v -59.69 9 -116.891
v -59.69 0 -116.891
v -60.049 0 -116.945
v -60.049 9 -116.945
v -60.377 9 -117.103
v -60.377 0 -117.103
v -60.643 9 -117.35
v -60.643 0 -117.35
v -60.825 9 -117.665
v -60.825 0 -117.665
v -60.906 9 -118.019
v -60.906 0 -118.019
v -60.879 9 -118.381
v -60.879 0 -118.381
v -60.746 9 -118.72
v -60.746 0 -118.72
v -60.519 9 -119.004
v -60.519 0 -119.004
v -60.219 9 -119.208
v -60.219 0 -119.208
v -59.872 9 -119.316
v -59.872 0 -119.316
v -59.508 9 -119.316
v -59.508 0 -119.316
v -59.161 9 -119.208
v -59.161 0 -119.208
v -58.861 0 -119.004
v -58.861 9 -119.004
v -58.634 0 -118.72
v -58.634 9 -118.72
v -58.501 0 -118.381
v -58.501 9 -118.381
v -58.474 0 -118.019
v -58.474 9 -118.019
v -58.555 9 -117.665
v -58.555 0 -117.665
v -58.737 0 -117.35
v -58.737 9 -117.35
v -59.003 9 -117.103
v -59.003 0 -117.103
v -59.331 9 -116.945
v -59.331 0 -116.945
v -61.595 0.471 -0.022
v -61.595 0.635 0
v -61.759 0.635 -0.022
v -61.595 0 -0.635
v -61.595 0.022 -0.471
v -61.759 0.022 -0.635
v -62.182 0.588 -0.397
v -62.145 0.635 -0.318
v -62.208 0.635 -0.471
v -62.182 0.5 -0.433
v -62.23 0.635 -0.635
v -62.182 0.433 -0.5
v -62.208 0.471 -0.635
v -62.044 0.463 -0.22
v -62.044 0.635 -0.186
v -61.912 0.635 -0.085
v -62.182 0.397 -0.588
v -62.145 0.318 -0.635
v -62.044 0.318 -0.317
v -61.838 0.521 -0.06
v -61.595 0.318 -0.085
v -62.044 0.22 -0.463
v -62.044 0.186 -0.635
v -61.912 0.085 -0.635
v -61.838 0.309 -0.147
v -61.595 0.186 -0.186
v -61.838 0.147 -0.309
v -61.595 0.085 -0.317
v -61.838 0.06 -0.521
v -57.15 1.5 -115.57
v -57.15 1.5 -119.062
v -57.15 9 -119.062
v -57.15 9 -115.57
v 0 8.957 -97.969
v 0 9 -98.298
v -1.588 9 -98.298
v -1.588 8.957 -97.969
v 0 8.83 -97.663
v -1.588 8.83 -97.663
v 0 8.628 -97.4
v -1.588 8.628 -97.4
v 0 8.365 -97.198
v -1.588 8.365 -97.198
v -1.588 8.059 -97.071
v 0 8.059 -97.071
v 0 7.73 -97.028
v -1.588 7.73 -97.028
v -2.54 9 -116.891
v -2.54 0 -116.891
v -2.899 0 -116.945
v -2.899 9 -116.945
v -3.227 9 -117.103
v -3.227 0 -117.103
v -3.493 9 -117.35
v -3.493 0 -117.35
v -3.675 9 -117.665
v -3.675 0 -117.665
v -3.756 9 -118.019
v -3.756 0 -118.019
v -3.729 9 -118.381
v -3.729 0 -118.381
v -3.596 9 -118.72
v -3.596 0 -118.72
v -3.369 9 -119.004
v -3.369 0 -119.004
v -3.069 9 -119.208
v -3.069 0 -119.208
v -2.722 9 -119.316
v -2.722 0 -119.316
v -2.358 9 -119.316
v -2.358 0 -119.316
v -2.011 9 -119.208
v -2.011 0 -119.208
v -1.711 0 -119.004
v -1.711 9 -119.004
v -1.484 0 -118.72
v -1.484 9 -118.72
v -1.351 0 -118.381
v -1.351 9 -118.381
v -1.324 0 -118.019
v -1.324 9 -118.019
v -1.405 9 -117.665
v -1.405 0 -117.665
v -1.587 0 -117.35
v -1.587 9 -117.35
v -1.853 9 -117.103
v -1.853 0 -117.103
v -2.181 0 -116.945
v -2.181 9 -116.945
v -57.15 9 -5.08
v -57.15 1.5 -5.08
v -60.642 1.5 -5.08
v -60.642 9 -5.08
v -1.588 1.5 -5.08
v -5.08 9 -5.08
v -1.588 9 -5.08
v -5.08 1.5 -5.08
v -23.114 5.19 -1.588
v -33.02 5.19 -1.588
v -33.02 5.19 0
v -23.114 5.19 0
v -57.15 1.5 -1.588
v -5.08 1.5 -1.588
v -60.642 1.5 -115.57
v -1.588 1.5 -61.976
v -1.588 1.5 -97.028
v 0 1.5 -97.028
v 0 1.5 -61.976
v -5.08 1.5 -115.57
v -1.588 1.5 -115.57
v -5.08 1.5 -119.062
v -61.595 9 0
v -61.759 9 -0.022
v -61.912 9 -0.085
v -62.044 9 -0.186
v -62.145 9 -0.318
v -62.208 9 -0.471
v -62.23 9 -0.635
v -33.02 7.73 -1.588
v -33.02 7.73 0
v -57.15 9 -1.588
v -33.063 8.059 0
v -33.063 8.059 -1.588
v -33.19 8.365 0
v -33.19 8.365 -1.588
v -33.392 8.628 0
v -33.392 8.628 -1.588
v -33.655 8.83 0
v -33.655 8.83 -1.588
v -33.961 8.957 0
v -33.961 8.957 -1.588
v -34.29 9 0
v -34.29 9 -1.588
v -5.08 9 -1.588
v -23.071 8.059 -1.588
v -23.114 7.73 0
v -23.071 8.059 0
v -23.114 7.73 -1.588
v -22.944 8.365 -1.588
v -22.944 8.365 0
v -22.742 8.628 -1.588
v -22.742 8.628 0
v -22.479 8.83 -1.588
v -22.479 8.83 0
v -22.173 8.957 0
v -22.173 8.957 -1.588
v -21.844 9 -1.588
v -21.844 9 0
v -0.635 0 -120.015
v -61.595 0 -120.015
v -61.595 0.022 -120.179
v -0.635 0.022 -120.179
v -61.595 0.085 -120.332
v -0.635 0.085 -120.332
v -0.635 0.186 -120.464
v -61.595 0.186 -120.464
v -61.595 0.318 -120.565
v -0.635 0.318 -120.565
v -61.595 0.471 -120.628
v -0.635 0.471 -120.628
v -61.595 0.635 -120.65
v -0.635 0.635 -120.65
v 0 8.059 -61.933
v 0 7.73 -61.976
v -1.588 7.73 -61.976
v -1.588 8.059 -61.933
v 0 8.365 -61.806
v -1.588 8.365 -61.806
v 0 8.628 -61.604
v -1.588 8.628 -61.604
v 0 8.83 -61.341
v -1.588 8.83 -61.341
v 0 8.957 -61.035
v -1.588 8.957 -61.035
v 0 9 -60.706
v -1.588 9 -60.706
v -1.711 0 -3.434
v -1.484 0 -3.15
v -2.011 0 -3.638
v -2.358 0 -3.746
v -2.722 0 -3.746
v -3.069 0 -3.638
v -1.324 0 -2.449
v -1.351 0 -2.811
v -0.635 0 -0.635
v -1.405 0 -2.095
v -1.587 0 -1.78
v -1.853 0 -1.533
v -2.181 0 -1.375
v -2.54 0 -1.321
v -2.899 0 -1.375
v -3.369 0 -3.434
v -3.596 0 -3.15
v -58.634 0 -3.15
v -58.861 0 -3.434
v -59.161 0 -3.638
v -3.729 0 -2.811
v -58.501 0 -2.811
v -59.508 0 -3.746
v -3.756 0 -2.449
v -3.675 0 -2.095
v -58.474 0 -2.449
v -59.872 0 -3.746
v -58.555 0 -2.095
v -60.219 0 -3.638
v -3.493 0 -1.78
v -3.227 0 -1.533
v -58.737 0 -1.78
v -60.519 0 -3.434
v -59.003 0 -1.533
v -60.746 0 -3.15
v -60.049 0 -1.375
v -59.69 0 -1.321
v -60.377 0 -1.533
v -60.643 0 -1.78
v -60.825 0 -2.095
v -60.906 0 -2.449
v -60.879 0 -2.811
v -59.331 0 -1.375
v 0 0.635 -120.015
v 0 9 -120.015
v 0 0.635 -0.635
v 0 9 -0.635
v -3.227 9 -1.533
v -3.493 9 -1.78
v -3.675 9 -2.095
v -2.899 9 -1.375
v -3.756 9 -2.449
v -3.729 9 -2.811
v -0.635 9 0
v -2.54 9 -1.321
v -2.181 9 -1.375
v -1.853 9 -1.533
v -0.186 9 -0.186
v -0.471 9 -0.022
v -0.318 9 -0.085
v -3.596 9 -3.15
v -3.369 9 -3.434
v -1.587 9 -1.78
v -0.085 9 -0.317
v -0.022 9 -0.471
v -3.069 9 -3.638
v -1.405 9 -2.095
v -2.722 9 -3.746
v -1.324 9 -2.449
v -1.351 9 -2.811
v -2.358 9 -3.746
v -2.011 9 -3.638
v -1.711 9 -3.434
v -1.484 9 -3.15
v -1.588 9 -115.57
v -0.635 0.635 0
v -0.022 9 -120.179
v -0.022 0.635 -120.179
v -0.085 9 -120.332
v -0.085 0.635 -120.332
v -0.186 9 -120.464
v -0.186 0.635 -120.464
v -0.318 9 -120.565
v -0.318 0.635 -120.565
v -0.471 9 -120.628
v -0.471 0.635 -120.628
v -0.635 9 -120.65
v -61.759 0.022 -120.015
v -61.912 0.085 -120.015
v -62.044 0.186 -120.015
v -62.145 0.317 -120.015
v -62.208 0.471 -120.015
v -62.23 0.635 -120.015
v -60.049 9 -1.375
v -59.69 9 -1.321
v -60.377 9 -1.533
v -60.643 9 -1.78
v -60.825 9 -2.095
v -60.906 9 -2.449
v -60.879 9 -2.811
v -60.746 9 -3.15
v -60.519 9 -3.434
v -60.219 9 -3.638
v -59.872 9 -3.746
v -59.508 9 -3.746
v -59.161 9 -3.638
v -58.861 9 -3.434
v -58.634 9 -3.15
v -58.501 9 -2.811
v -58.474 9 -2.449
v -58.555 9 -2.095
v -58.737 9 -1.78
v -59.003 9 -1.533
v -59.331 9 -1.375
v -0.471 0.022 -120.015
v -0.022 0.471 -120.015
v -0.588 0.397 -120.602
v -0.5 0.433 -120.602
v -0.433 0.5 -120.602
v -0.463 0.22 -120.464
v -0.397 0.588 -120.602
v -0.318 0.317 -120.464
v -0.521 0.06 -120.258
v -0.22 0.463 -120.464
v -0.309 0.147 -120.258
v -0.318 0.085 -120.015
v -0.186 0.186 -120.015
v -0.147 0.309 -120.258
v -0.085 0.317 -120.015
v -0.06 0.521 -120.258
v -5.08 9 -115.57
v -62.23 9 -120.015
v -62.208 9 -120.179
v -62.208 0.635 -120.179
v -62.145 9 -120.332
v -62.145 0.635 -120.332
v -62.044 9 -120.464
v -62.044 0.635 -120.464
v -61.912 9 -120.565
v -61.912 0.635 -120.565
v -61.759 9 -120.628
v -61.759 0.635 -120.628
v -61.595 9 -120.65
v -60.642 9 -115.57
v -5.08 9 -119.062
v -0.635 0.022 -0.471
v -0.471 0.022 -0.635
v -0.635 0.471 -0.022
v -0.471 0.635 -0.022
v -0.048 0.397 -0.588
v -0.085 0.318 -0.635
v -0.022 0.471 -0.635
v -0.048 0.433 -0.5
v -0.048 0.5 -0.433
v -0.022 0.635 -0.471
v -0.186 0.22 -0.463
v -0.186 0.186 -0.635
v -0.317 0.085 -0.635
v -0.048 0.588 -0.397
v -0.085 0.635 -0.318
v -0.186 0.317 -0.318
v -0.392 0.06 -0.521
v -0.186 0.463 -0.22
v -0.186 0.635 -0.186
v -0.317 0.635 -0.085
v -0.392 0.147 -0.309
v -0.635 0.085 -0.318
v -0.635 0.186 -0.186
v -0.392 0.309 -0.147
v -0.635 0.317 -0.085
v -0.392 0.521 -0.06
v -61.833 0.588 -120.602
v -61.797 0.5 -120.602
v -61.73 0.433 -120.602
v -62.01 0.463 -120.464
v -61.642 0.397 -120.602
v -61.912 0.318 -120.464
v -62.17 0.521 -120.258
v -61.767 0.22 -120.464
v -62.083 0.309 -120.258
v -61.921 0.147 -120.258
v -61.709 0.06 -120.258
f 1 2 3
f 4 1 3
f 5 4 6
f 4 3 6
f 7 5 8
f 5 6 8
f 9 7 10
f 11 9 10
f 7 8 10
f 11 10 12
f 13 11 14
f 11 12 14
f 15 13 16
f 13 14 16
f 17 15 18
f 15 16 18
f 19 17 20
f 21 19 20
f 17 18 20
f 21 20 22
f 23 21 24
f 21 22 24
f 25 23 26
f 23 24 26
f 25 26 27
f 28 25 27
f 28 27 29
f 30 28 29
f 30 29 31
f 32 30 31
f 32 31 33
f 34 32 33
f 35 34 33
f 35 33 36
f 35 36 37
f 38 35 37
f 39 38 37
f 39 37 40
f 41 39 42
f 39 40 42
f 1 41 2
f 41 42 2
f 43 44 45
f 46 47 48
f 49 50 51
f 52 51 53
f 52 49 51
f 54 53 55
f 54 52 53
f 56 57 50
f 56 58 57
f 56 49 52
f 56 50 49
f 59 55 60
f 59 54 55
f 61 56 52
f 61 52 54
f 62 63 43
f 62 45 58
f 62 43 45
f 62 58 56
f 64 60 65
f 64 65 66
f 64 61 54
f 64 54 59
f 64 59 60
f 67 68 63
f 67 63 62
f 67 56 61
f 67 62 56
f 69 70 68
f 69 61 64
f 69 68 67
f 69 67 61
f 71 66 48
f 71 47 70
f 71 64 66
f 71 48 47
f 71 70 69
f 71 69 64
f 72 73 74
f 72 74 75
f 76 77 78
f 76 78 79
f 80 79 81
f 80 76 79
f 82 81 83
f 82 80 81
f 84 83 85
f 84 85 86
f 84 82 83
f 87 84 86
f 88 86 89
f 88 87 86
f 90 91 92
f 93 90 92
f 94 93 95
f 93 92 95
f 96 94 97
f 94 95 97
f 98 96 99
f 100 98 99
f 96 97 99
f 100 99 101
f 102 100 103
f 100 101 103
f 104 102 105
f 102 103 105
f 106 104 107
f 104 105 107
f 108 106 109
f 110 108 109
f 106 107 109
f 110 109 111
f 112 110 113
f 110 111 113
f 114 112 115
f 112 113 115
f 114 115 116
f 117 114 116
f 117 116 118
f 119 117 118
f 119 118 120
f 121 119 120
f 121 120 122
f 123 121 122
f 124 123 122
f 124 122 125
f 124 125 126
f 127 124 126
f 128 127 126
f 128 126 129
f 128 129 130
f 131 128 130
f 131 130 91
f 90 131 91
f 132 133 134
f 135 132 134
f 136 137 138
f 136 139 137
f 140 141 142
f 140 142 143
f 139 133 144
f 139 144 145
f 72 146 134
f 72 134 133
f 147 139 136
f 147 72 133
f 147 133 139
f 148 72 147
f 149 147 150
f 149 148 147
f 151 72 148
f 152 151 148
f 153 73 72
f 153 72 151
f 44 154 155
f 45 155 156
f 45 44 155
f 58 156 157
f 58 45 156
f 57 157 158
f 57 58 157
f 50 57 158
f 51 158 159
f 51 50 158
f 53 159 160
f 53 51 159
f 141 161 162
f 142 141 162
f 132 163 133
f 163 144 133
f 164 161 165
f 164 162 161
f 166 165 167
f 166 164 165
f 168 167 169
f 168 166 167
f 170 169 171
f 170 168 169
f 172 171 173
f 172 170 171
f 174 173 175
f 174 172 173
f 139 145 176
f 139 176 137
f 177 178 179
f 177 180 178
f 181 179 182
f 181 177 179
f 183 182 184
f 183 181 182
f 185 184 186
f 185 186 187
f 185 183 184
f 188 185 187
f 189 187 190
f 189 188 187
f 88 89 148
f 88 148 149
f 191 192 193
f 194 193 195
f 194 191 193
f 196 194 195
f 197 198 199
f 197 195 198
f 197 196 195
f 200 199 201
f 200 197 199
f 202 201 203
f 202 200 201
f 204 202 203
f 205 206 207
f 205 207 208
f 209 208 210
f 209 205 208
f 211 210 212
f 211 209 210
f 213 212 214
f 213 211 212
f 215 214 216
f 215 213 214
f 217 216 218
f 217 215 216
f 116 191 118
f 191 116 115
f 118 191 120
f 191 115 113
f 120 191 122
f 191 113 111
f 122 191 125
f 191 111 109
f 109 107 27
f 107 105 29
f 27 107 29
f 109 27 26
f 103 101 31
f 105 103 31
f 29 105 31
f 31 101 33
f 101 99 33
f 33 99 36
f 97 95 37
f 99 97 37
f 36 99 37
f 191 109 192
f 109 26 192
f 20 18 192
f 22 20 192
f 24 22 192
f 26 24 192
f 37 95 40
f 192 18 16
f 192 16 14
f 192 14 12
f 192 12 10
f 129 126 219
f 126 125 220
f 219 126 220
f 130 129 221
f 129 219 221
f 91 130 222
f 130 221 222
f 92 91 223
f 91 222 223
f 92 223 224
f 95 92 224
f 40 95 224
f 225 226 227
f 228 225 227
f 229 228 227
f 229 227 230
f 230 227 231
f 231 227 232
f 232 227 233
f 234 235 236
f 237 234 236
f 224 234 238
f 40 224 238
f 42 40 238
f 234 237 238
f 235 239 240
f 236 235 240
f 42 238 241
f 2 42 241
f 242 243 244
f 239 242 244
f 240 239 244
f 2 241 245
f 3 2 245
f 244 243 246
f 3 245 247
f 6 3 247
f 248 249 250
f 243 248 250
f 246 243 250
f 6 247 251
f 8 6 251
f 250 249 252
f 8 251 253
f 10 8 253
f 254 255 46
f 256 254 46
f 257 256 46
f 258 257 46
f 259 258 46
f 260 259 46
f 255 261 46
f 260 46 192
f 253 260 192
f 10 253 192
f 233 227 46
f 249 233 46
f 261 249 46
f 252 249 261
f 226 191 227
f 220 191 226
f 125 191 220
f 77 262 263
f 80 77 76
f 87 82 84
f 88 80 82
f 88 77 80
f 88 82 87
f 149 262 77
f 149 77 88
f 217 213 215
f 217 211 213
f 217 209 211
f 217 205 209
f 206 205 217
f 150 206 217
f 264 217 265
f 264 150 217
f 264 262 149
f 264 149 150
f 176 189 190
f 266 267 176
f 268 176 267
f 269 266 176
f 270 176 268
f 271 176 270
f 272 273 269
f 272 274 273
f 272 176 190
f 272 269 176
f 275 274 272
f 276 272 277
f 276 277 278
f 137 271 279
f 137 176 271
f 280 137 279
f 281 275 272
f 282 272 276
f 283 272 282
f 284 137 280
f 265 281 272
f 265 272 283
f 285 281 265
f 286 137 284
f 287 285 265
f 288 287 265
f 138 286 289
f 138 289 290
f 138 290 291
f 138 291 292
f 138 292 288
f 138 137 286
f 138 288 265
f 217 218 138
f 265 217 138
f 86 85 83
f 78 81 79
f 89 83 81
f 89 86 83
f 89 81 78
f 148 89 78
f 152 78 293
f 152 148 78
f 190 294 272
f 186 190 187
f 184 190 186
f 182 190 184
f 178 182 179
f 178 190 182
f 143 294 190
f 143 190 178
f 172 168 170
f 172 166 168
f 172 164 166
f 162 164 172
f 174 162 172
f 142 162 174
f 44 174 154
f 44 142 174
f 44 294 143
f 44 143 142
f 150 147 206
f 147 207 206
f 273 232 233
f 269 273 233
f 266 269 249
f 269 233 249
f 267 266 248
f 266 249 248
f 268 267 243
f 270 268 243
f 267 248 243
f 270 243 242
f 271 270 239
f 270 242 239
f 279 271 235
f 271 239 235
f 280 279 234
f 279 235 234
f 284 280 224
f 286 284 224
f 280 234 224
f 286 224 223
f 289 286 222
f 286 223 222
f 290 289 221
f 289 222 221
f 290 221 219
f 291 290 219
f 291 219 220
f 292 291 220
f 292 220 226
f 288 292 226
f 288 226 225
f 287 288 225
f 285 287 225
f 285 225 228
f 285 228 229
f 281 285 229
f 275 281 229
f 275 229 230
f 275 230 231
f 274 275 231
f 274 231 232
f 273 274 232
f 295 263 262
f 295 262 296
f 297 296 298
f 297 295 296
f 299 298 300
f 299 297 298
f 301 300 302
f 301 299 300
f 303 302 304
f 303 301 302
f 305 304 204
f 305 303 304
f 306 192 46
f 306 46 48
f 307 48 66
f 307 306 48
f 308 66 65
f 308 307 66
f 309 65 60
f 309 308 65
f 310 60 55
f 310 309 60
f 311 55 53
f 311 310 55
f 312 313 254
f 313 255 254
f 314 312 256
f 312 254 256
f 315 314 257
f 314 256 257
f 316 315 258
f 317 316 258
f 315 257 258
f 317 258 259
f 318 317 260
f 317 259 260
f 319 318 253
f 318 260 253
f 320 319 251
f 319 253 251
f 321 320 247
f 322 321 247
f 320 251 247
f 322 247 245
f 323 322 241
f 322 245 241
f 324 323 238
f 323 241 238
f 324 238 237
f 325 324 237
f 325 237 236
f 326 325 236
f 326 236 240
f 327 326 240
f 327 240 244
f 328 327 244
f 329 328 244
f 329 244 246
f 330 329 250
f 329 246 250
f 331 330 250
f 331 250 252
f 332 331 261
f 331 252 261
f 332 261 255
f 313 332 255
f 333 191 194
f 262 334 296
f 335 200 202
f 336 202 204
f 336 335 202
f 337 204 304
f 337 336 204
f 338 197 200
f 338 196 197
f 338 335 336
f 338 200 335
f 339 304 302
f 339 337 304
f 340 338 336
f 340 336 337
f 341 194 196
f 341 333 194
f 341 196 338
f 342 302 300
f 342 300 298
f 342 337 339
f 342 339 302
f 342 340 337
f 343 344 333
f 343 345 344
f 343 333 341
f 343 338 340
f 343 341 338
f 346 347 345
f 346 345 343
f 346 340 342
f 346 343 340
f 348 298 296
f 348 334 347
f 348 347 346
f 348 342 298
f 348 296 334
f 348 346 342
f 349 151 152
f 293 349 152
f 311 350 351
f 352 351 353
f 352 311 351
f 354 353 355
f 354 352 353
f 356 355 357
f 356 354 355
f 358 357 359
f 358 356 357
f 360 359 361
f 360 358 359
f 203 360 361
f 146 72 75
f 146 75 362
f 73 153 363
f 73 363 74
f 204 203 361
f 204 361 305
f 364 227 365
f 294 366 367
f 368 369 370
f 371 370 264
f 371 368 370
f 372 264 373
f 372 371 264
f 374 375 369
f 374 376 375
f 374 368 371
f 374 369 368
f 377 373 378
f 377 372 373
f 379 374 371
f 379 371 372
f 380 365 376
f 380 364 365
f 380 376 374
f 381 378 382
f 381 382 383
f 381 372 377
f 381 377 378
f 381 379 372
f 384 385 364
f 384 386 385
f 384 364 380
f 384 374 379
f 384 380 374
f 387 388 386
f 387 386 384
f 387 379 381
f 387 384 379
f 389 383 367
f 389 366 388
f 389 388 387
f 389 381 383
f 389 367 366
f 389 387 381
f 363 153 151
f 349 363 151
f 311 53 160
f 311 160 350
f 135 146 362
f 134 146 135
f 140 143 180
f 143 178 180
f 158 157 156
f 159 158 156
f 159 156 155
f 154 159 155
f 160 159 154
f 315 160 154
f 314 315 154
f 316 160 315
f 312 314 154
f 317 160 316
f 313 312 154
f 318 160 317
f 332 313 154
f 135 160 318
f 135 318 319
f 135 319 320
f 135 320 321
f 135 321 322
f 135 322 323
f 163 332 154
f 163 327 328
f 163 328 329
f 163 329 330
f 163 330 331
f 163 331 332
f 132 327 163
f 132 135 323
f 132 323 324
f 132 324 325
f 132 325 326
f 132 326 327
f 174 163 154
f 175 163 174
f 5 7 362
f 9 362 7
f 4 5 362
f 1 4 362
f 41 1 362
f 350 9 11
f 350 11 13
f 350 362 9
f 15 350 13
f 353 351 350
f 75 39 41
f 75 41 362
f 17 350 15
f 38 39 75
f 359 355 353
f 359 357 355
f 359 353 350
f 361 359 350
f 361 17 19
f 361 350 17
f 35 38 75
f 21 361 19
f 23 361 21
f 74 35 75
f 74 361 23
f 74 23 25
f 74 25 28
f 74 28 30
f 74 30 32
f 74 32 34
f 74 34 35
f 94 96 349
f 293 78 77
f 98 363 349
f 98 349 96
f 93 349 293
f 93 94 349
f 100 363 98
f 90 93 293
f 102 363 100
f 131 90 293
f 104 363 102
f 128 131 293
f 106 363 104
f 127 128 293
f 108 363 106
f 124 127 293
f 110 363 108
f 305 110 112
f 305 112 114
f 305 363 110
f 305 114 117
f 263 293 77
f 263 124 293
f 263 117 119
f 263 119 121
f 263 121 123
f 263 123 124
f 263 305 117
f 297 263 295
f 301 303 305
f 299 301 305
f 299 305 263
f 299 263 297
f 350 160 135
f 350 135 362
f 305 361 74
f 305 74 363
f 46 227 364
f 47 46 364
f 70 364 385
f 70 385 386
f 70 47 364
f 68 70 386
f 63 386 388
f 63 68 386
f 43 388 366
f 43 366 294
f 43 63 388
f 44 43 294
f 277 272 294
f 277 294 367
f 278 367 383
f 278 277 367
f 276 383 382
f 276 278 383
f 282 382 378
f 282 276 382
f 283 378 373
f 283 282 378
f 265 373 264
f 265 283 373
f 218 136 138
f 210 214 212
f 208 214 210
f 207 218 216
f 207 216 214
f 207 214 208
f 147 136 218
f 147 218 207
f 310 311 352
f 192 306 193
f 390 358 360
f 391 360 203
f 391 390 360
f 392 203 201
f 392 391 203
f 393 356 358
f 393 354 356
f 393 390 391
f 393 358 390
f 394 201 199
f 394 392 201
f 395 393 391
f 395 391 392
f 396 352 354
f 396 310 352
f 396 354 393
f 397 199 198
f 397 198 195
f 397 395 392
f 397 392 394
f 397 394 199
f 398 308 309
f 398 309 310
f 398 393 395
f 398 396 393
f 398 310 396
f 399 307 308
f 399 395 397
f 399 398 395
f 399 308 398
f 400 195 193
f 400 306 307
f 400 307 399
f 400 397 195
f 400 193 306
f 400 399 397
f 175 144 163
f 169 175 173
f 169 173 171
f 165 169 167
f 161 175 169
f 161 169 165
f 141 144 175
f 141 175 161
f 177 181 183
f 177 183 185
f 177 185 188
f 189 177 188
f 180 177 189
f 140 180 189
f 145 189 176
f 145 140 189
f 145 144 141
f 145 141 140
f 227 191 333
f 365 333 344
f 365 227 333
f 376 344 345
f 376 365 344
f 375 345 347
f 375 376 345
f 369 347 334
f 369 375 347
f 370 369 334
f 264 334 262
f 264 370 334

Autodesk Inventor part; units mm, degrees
ref_plane "YZ Plane" through (0, 0, 0) normal (1, 0, 0) x (0, 1, 0)
ref_plane "XZ Plane" through (0, 0, 0) normal (0, 1, 0) x (-1, 0, 0)
ref_plane "XY Plane" through (0, 0, 0) normal (0, 0, 1) x (1, 0, 0)
sketch "Sketch1" plane through (0, 0, 0) normal (0, 1, 0) x (-1, 0, 0)
  line L0 (0, 0) -> (62.23, 0)
  line L1 (62.23, 0) -> (62.23, -120.65)
  line L2 (62.23, -120.65) -> (0, -120.65)
  line L3 (0, -120.65) -> (0, 0)
  dimension "d0" = 62.23
  dimension "d1" = 120.65
extrude "Extrusion1" add sketch "Sketch1" along normal blind 1.5
sketch "Sketch2" plane through (0, 1.5, 0) normal (0, 1, 0) x (1, 0, 0)
  line L0 (-60.6425, 1.5875) -> (-1.5875, 1.5875)
  line L1 (-1.5875, 1.5875) -> (-1.5875, 119.0625)
  line L2 (-1.5875, 119.0625) -> (-60.6425, 119.0625)
  line L3 (-60.6425, 119.0625) -> (-60.6425, 1.5875)
  line L4 (-62.23, 0) -> (0, 0) projected
  line L5 (0, 0) -> (0, 120.65) projected
  line L6 (-62.23, 120.65) -> (-62.23, 0) projected
  line L7 (0, 120.65) -> (-62.23, 120.65) projected
  line L8 (0, 0) -> (-5.08, 0)
  line L9 (-5.08, 0) -> (-5.08, 5.08)
  line L10 (-5.08, 5.08) -> (0, 5.08)
  line L11 (0, 5.08) -> (0, 0)
  line L12 (-62.23, 0) -> (-57.15, 0)
  line L13 (-57.15, 0) -> (-57.15, 5.08)
  line L14 (-57.15, 5.08) -> (-62.23, 5.08)
  line L15 (-62.23, 5.08) -> (-62.23, 0)
  line L16 (0, 120.65) -> (-5.08, 120.65)
  line L17 (-5.08, 120.65) -> (-5.08, 115.57)
  line L18 (-5.08, 115.57) -> (0, 115.57)
  line L19 (0, 115.57) -> (0, 120.65)
  line L20 (-62.23, 120.65) -> (-57.15, 120.65)
  line L21 (-57.15, 120.65) -> (-57.15, 115.57)
  line L22 (-57.15, 115.57) -> (-62.23, 115.57)
  line L23 (-62.23, 115.57) -> (-62.23, 120.65)
  point P0 (0, 115.57)
  point P1 (-1.5875, 115.57)
  point P2 (-1.5875, 5.08)
  point P3 (-5.08, 1.5875)
  point P4 (-57.15, 1.5875)
  point P5 (-60.6425, 5.08)
  point P6 (-5.08, 119.0625)
  point P7 (-60.6425, 115.57)
  point P8 (-57.15, 119.0625)
  dimension "d4" = 1.5875
  dimension "d5" = 1.5875
  dimension "d6" = 1.5875
  dimension "d7" = 1.5875
  dimension "d8" = 5.08
  dimension "d9" = 5.08
  dimension "d10" = 5.08
  dimension "d11" = 5.08
  dimension "d12" = 5.08
  dimension "d13" = 5.08
  dimension "d14" = 5.08
  dimension "d15" = 5.08
extrude "Extrusion3" add sketch "Sketch2" along normal blind 7.5 contours L3 L14 L13 L0 | L0 L13 L4 L6 L14 L3 | L0 L9 L4 L13 | L14 L6 L22 L3 | L9 L10 L1 L0 | L0 L1 L10 L5 L4 L9 | L22 L6 L7 L21 L2 L3 | L3 L2 L21 L22 | L1 L18 L5 L10 | L21 L7 L17 L2 | L18 L17 L2 L1 | L1 L2 L17 L7 L5 L18
sketch "Sketch3" plane through (0, 9, 0) normal (0, 1, 0) x (1, 0, 0)
  line L0 (-62.23, 0) -> (0, 0) projected
  line L1 (-33.02, 0) -> (-23.114, 0)
  line L2 (-23.114, 0) -> (-23.114, 1.5875)
  line L3 (-23.114, 1.5875) -> (-33.02, 1.5875)
  line L4 (-33.02, 1.5875) -> (-33.02, 0)
  line L5 (0, 0) -> (0, 120.65) projected
  line L6 (-62.23, 120.65) -> (-62.23, 0) projected
  line L7 (0, 120.65) -> (-62.23, 120.65) projected
  line L8 (-60.6425, 115.57) -> (-60.6425, 5.08) projected
  line L9 (-62.23, 60.325) -> (-60.6425, 60.325)
  line L10 (-60.6425, 60.325) -> (-60.6425, 98.425)
  line L11 (-60.6425, 98.425) -> (-62.23, 98.425)
  line L12 (-62.23, 98.425) -> (-62.23, 60.325)
  point P0 (-59.69, 2.54)
  point P1 (-59.69, 118.11)
  point P2 (-2.54, 118.11)
  point P3 (-2.54, 2.54)
  dimension "d20" = 23.114
  dimension "d22" = 2.54
  dimension "d23" = 2.54
  dimension "d24" = 2.54
  dimension "d25" = 2.54
  dimension "d26" = 2.54
  dimension "d27" = 2.54
  dimension "d28" = 2.54
  dimension "d29" = 2.54
  dimension "d47" = 60.325
  dimension "d48" = 22.225
  dimension "d59" = 33.02
extrude "Extrusion4" cut sketch "Sketch3" against normal blind 3.81 contours L4 L3 L2 L0
sketch "Sketch4" plane through (0, 9, 0) normal (0, 1, 0) x (1, 0, 0)
  line L0 (-23.114, 0) -> (0, 0) projected
  line L1 (0, 0) -> (0, 120.65) projected
  line L2 (-62.23, 0) -> (-33.02, 0) projected
  line L3 (-62.23, 120.65) -> (-62.23, 0) projected
  line L4 (0, 120.65) -> (-62.23, 120.65) projected
  point P0 (-2.54, 2.54)
  point P1 (-2.54, 118.11)
  point P2 (-59.69, 118.11)
  point P3 (-59.69, 2.54)
  dimension "d39" = 2.54
  dimension "d40" = 2.54
  dimension "d41" = 2.54
  dimension "d42" = 2.54
  dimension "d43" = 2.54
  dimension "d44" = 2.54
  dimension "d45" = 2.54
  dimension "d46" = 2.54
hole "Hole1" at (-2.54, 9, -2.54) at (-2.54, 9, -118.11) at (-59.69, 9, -118.11) at (-59.69, 9, -2.54) direction (0, -1, 0) diameter 2.4384 end through all clearance for "Socket Head Cap Screw" size "#2" standard "Ansi Unified Screw Threads"
sketch "Sketch5" plane through (0, 9, 0) normal (0, 1, 0) x (1, 0, 0)
  line L0 (-62.23, 91.65) -> (-60.6425, 91.65)
  line L1 (-60.6425, 5.08) -> (-60.6425, 115.57) projected
  line L2 (-62.23, 120.65) -> (-62.23, 0) projected
  line L3 (-62.23, 79) -> (-60.6425, 79)
  line L4 (-62.23, 84) -> (-60.6425, 84)
  line L5 (-62.23, 75) -> (-60.6425, 75)
  line L6 (-62.23, 62) -> (-60.6425, 62)
  line L7 (-62.23, 0) -> (-33.02, 0) projected
  line L8 (0, 120.65) -> (-62.23, 120.65) projected
  line L9 (-62.23, 96.65) -> (-60.6425, 96.65)
  line L10 (-1.5875, 115.57) -> (-1.5875, 5.08) projected
  line L11 (-1.5875, 61.976) -> (0, 61.976)
  line L12 (-1.5875, 97.028) -> (0, 97.028)
  line L13 (0, 0) -> (0, 120.65) projected
  line L14 (-23.114, 0) -> (0, 0) projected
  dimension "d49" = 62
  dimension "d50" = 75
  dimension "d51" = 79
  dimension "d52" = 5
  dimension "d53" = 29
  dimension "d54" = 5
  dimension "d60" = 61.976
  dimension "d61" = 97.028
extrude "Extrusion5" cut sketch "Sketch5" against normal up to surface (7.5 mm away) contours L13 L11 L10 L12
fillet "Fillet1" radius 1.27 4 edges at (-33.02, 9, -0.7938) (-23.114, 9, -0.7938) (-0.7938, 9, -61.976) (-0.7938, 9, -97.028)
fillet "Fillet2" radius 0.635 8 edges at (-31.115, 0, 0) (0, 0, -60.325) (0, 4.5, 0) (-62.23, 4.5, 0) (-62.23, 0, -60.325) (-31.115, 0, -120.65) (0, 4.5, -120.65) (-62.23, 4.5, -120.65)
equation "\"d4\" = d5"
equation "\"d6\" = d5"
equation "\"d7\" = d5"
equation "\"d10\" = d8"
equation "\"d11\" = d10"
equation "\"d12\" = d8"
equation "\"d13\" = d8"
equation "\"d14\" = d8"
equation "\"d15\" = d8"
equation "\"d24\" = d22"
equation "\"d25\" = d24"
equation "\"d26\" = d25"
equation "\"d27\" = d26"
equation "\"d28\" = d22"
equation "\"d29\" = d28"
equation "\"d40\" = d39"
equation "\"d41\" = d39"
equation "\"d42\" = d41"
equation "\"d43\" = d42"
equation "\"d44\" = d43"
equation "\"d45\" = d44"
equation "\"d46\" = d45"
properties part number "cover_bottom"
